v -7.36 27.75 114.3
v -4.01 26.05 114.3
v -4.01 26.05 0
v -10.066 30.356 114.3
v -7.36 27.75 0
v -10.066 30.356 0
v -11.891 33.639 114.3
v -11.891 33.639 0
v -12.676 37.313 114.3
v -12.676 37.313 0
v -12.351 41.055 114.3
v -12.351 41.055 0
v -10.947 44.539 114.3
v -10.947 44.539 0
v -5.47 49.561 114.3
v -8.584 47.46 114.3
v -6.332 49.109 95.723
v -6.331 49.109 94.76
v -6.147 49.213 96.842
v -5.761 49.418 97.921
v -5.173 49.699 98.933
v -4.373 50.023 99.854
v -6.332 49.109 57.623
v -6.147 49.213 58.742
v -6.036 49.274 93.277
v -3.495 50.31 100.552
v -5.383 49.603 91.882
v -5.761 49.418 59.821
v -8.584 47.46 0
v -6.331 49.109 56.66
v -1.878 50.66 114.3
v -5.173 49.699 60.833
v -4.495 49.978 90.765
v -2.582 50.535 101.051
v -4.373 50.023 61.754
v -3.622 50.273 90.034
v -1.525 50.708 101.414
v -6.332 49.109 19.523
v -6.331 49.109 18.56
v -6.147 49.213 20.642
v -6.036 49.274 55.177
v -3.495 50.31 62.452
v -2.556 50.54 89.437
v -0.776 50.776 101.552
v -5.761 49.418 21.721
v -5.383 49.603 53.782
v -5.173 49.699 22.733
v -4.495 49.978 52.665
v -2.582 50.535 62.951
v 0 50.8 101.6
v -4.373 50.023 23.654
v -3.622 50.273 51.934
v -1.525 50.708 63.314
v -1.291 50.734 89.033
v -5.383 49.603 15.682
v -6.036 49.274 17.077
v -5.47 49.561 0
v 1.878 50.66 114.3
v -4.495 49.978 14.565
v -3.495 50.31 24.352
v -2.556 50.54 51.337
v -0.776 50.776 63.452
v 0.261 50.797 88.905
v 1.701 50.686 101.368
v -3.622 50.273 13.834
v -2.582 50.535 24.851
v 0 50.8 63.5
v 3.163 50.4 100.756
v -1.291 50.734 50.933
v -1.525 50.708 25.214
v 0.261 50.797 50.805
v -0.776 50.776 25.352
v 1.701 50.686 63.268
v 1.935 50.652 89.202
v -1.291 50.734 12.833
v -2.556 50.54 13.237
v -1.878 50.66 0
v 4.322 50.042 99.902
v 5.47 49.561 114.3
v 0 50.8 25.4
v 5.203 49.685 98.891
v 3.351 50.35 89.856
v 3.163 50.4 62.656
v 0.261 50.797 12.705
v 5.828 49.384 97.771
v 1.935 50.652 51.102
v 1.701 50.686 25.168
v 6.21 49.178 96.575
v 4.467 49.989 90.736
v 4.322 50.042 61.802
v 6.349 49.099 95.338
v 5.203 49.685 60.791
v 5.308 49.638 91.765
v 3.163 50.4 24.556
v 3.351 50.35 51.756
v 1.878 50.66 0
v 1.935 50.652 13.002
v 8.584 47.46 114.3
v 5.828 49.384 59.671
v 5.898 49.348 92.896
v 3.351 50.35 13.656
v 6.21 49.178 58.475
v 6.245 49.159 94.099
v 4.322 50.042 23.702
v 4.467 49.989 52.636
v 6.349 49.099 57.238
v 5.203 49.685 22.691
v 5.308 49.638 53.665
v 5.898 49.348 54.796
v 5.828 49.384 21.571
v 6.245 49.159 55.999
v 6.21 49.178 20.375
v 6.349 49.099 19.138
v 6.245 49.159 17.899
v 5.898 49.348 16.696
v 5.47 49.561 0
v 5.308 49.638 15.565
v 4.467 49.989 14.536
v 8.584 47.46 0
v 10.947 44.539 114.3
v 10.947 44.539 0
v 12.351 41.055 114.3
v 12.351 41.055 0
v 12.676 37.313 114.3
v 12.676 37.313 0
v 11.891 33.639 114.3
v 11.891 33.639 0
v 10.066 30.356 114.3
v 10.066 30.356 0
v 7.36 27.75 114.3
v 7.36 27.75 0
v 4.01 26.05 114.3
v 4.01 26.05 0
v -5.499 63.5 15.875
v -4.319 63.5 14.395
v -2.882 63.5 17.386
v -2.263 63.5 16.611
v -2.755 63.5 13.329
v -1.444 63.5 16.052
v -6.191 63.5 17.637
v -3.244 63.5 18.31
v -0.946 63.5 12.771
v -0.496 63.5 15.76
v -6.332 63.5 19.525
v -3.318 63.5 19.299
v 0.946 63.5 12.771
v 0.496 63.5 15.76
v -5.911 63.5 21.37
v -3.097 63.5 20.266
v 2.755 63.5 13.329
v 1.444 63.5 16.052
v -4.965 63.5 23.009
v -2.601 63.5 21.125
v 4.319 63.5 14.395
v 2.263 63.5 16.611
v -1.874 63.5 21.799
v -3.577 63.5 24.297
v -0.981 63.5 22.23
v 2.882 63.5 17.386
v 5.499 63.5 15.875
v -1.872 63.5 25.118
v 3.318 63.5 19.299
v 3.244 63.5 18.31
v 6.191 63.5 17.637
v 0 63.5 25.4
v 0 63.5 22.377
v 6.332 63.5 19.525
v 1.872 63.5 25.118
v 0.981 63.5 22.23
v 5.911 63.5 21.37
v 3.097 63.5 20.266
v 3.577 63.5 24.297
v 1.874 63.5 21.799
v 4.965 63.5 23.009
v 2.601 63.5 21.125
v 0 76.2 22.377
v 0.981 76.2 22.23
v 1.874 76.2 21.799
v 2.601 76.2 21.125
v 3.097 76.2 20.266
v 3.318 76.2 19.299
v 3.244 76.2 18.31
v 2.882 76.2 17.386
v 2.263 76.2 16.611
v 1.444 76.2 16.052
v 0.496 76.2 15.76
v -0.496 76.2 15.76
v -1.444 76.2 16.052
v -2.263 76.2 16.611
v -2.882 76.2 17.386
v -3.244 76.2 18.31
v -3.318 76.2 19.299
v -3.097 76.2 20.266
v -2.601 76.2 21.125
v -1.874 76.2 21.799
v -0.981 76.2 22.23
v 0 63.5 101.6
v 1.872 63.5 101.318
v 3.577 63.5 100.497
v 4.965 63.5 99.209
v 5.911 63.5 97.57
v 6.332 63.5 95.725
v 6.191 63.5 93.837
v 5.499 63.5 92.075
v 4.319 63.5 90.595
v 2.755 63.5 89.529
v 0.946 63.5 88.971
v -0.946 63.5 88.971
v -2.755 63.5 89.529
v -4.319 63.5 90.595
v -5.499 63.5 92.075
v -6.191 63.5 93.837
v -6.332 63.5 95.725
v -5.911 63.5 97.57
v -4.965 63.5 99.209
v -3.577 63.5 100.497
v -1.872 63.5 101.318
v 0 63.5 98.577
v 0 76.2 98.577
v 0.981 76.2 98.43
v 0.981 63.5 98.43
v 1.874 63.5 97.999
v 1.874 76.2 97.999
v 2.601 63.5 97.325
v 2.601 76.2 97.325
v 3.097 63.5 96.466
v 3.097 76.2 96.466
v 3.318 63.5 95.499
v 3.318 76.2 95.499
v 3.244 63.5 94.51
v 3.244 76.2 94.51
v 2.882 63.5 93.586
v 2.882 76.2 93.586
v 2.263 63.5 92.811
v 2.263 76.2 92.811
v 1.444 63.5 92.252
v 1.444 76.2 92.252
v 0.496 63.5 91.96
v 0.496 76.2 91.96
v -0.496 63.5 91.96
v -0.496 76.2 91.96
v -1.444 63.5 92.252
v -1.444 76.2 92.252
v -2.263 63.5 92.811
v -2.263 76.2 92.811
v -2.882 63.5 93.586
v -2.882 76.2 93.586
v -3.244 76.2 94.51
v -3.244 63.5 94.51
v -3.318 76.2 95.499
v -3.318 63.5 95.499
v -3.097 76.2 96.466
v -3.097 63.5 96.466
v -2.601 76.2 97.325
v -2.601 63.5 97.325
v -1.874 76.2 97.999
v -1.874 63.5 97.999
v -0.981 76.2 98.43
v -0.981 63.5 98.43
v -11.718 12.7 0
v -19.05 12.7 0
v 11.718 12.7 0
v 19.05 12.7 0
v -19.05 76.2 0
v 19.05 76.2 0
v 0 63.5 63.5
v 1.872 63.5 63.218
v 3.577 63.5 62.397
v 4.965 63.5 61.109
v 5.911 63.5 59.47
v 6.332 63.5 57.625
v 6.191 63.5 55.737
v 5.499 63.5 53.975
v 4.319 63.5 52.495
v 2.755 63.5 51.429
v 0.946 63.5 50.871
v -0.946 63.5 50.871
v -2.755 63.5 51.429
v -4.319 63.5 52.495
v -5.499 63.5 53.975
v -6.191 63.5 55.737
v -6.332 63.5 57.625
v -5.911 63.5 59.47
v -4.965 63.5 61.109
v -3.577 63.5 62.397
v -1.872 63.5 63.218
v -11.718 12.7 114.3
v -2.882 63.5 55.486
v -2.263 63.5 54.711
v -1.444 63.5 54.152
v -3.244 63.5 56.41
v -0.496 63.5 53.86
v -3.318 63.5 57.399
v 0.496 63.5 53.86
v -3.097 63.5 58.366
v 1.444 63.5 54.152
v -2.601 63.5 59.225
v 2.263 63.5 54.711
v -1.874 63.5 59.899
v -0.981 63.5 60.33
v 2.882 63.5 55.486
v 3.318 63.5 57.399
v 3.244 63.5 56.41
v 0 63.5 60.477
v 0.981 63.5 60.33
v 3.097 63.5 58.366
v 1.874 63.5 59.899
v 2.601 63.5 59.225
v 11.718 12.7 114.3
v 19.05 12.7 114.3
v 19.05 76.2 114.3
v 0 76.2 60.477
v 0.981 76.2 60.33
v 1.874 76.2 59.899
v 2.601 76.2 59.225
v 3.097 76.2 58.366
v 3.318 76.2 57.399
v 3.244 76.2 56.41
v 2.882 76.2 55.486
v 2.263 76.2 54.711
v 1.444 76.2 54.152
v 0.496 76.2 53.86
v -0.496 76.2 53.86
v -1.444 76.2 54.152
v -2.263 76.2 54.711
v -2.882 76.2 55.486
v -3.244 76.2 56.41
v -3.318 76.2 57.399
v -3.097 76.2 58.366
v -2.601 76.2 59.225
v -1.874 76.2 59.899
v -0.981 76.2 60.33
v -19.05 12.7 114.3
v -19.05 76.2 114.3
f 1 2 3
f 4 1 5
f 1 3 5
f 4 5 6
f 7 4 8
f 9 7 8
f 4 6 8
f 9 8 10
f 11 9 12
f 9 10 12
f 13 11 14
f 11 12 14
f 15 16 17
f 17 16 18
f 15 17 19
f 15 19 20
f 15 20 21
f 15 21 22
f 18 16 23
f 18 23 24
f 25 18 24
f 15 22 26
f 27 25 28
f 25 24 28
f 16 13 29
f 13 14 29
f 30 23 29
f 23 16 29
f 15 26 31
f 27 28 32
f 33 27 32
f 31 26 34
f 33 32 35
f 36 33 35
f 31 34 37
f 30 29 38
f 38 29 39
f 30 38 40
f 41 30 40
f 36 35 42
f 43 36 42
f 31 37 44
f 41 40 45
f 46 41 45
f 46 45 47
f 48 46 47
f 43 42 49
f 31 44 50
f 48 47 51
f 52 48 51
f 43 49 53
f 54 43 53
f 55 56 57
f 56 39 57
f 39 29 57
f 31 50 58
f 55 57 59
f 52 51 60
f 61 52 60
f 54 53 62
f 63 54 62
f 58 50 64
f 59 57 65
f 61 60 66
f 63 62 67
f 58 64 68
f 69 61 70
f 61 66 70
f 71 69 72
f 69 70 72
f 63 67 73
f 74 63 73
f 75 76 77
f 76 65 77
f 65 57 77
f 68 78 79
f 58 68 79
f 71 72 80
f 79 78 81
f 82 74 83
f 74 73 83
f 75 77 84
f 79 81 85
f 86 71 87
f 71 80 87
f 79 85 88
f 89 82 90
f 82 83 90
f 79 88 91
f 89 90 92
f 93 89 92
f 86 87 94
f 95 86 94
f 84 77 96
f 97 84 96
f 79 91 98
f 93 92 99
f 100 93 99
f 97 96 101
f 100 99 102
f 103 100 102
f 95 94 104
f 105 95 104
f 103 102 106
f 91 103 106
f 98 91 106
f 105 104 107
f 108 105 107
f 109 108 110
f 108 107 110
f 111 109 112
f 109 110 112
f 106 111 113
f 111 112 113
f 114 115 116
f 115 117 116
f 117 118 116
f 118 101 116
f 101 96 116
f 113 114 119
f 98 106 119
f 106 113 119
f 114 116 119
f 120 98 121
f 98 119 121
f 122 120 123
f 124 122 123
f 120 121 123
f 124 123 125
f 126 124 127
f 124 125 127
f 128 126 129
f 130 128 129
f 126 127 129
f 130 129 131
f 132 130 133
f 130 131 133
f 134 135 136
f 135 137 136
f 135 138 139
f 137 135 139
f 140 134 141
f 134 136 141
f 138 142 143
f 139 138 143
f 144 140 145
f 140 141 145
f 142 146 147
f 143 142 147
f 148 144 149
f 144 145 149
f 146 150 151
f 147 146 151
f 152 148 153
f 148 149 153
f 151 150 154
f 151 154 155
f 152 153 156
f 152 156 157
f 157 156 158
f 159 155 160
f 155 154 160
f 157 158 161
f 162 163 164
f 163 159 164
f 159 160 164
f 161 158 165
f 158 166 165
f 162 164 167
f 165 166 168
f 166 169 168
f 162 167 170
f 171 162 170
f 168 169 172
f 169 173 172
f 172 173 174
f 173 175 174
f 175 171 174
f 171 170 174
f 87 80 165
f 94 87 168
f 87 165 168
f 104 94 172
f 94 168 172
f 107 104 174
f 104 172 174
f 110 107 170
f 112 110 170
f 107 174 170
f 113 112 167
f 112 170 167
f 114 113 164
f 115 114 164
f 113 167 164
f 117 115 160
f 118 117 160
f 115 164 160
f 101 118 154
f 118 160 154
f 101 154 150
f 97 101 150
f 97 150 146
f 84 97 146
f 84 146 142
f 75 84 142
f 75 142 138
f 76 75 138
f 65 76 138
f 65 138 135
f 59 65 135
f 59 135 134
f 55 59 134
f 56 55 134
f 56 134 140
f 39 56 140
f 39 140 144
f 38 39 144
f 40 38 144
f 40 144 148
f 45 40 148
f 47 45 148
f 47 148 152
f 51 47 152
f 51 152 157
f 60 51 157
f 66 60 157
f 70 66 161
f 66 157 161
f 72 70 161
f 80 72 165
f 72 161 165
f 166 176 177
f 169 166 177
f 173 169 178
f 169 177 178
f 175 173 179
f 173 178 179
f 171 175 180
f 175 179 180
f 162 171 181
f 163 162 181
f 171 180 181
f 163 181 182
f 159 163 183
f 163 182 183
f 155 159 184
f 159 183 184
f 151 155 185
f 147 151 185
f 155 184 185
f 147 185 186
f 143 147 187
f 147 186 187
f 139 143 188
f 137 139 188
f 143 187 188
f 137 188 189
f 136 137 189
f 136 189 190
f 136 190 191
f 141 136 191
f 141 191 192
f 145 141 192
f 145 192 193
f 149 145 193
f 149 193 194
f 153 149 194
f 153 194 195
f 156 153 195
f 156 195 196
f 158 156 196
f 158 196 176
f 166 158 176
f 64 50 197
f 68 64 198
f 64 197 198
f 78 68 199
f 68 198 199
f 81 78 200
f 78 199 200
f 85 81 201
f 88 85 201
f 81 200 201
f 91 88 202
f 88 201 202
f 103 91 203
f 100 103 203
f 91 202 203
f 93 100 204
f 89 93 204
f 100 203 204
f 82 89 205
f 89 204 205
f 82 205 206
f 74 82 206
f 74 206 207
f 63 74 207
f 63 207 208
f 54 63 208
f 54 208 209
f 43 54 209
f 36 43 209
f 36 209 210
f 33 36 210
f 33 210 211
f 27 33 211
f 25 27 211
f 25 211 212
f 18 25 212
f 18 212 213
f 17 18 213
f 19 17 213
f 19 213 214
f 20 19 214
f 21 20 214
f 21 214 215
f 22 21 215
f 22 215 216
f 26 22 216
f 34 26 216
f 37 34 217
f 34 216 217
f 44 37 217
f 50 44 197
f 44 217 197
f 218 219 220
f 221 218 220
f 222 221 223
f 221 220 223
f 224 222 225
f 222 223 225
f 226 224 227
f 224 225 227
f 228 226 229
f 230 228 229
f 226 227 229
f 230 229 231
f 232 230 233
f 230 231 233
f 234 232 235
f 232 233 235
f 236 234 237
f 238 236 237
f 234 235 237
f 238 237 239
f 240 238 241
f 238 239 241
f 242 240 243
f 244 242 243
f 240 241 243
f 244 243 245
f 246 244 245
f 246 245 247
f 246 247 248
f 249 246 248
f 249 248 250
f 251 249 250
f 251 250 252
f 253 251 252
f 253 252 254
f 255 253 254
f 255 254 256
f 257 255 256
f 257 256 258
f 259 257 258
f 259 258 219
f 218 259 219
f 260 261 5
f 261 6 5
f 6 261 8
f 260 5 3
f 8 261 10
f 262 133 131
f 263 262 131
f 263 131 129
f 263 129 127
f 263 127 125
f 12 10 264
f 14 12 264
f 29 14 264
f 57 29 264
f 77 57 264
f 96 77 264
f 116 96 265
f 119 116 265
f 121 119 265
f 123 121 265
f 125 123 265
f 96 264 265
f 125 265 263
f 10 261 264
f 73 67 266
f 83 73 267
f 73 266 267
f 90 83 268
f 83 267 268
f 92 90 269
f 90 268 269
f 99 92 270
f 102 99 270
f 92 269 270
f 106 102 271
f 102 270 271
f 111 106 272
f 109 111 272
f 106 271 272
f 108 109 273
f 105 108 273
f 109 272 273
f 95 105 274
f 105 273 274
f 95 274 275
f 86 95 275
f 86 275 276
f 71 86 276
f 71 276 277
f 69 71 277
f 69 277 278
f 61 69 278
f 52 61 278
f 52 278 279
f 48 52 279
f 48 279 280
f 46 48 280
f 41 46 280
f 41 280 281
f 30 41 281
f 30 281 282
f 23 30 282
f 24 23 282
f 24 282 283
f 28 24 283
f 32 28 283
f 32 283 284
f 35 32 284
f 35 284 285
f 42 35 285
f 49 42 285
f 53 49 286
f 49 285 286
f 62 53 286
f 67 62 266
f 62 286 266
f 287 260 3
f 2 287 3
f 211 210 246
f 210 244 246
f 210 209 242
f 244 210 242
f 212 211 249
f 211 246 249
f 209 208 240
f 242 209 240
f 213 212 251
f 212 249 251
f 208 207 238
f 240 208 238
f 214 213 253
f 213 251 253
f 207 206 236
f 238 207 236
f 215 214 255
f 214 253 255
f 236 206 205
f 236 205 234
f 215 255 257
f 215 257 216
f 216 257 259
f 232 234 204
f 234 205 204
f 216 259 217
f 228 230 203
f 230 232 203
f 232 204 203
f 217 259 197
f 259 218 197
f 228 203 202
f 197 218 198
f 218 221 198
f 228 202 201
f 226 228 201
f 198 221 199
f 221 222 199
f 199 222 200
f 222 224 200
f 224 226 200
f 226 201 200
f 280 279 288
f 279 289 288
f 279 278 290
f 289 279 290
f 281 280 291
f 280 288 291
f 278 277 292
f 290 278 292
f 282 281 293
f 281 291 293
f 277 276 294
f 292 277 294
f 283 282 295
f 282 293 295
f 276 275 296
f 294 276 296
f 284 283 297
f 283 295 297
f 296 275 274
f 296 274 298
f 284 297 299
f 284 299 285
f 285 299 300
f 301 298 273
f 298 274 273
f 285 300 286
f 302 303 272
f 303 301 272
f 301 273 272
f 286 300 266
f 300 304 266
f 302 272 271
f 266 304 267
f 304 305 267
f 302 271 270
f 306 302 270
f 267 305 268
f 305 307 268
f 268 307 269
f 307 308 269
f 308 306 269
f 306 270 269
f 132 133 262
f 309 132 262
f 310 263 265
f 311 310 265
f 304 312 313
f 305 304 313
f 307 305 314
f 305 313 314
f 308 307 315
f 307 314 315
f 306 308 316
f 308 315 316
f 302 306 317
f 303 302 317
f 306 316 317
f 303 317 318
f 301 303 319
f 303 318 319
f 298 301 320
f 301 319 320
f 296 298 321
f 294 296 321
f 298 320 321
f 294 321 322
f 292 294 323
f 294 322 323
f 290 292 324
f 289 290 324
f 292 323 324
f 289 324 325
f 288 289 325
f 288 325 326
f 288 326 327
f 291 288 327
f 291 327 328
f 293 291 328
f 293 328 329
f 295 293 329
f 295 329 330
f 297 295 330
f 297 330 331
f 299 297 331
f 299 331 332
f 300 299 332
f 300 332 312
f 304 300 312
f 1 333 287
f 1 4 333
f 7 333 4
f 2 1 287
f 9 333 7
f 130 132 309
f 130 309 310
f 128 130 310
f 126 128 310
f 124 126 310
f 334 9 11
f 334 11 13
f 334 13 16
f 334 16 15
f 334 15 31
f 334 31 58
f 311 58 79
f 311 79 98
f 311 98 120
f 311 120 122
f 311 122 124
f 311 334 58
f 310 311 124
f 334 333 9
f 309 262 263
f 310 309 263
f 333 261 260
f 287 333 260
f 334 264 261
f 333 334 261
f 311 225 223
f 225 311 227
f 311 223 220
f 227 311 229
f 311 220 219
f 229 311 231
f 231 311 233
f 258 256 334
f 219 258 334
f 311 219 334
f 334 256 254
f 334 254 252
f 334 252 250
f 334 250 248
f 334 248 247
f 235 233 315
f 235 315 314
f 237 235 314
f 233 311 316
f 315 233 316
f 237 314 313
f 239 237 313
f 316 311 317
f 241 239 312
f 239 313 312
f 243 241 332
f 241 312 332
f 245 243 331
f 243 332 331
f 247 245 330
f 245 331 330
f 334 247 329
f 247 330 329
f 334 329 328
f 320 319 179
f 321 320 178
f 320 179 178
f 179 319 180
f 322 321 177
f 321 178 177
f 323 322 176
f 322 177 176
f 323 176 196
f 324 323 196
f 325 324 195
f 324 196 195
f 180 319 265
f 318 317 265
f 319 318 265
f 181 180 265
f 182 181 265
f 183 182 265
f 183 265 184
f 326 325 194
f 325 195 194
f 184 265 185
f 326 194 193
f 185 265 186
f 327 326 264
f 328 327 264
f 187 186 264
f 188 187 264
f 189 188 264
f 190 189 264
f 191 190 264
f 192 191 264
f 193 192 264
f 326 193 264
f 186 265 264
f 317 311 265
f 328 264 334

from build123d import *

# Parameters (mm, degrees)
BOSS_EXTRUDE1_DEPTH     = 114.3
SKETCH2_R               = 3.3274
CUT_EXTRUDE1_DEPTH      = 133.134940496
CUT_EXTRUDE2_REACH      = 128.523
CUT_EXTRUDE2_END_RADIUS = 12.7
SKETCH3_R               = 6.35


with BuildPart() as part:
    # Sketch1 → Boss-Extrude1 (new body)
    with BuildSketch(Plane.XY):
        with BuildLine():
            Line((4.010170085, 26.049749551), (11.717651581, 12.7))
            Line((11.717651581, 12.7), (19.05, 12.7))
            Line((19.05, 12.7), (19.05, 76.2))
            Line((19.05, 76.2), (-19.05, 76.2))
            Line((-19.05, 76.2), (-19.05, 12.7))
            Line((-19.05, 12.7), (-11.717651581, 12.7))
            Line((-11.717651581, 12.7), (-4.010170085, 26.049749551))
            ThreePointArc((-4.010170085, 26.049749551), (0, 50.8), (4.010170085, 26.049749551))
        make_face()
    extrude(amount=BOSS_EXTRUDE1_DEPTH)

    # Sketch2 → Cut-Extrude1 (cut, through all)
    with BuildSketch(Plane(origin=(0, 76.2, 0), x_dir=(1, 0, 0), z_dir=(0, 1, 0))):
        with Locations(Location((0, -19.05, 0), (0, 0, 270))):
            Circle(SKETCH2_R)
        with Locations(Location((0, -57.15, 0), (0, 0, 270))):
            Circle(SKETCH2_R)
        with Locations(Location((0, -95.25, 0), (0, 0, 270))):
            Circle(SKETCH2_R)
    extrude(amount=-CUT_EXTRUDE1_DEPTH, mode=Mode.SUBTRACT)

    # Cut-Extrude2: up to this cylinder (the profile starts outside it)
    cut_extrude2_end = Plane(origin=(0, 38.1, 57.15), z_dir=(0, 0, -1)) * Cylinder(CUT_EXTRUDE2_END_RADIUS, 359.646, mode=Mode.PRIVATE)
    # Sketch3 → Cut-Extrude2 (cut, up to the surface)
    with BuildSketch(Plane(origin=(0, 63.5, 0), x_dir=(1, 0, 0), z_dir=(0, 1, 0)), mode=Mode.PRIVATE) as cut_extrude2_sk1:
        with Locations(Location((0, -19.05, 0), (0, 0, 270))):
            Circle(SKETCH3_R)
    cut_extrude2_tool1 = extrude(cut_extrude2_sk1.sketch, amount=-CUT_EXTRUDE2_REACH, mode=Mode.PRIVATE) - cut_extrude2_end
    add(cut_extrude2_tool1.solids().sort_by_distance((0, 63.5, 19.05))[0], mode=Mode.SUBTRACT)
    # Sketch3 → Cut-Extrude2 (cut, up to the surface)
    with BuildSketch(Plane(origin=(0, 63.5, 0), x_dir=(1, 0, 0), z_dir=(0, 1, 0)), mode=Mode.PRIVATE) as cut_extrude2_sk2:
        with Locations(Location((0, -57.15, 0), (0, 0, 270))):
            Circle(SKETCH3_R)
    cut_extrude2_tool2 = extrude(cut_extrude2_sk2.sketch, amount=-CUT_EXTRUDE2_REACH, mode=Mode.PRIVATE) - cut_extrude2_end
    add(cut_extrude2_tool2.solids().sort_by_distance((0, 63.5, 57.15))[0], mode=Mode.SUBTRACT)
    # Sketch3 → Cut-Extrude2 (cut, up to the surface)
    with BuildSketch(Plane(origin=(0, 63.5, 0), x_dir=(1, 0, 0), z_dir=(0, 1, 0)), mode=Mode.PRIVATE) as cut_extrude2_sk3:
        with Locations(Location((0, -95.25, 0), (0, 0, 270))):
            Circle(SKETCH3_R)
    cut_extrude2_tool3 = extrude(cut_extrude2_sk3.sketch, amount=-CUT_EXTRUDE2_REACH, mode=Mode.PRIVATE) - cut_extrude2_end
    add(cut_extrude2_tool3.solids().sort_by_distance((0, 63.5, 95.25))[0], mode=Mode.SUBTRACT)


solid = part.part
